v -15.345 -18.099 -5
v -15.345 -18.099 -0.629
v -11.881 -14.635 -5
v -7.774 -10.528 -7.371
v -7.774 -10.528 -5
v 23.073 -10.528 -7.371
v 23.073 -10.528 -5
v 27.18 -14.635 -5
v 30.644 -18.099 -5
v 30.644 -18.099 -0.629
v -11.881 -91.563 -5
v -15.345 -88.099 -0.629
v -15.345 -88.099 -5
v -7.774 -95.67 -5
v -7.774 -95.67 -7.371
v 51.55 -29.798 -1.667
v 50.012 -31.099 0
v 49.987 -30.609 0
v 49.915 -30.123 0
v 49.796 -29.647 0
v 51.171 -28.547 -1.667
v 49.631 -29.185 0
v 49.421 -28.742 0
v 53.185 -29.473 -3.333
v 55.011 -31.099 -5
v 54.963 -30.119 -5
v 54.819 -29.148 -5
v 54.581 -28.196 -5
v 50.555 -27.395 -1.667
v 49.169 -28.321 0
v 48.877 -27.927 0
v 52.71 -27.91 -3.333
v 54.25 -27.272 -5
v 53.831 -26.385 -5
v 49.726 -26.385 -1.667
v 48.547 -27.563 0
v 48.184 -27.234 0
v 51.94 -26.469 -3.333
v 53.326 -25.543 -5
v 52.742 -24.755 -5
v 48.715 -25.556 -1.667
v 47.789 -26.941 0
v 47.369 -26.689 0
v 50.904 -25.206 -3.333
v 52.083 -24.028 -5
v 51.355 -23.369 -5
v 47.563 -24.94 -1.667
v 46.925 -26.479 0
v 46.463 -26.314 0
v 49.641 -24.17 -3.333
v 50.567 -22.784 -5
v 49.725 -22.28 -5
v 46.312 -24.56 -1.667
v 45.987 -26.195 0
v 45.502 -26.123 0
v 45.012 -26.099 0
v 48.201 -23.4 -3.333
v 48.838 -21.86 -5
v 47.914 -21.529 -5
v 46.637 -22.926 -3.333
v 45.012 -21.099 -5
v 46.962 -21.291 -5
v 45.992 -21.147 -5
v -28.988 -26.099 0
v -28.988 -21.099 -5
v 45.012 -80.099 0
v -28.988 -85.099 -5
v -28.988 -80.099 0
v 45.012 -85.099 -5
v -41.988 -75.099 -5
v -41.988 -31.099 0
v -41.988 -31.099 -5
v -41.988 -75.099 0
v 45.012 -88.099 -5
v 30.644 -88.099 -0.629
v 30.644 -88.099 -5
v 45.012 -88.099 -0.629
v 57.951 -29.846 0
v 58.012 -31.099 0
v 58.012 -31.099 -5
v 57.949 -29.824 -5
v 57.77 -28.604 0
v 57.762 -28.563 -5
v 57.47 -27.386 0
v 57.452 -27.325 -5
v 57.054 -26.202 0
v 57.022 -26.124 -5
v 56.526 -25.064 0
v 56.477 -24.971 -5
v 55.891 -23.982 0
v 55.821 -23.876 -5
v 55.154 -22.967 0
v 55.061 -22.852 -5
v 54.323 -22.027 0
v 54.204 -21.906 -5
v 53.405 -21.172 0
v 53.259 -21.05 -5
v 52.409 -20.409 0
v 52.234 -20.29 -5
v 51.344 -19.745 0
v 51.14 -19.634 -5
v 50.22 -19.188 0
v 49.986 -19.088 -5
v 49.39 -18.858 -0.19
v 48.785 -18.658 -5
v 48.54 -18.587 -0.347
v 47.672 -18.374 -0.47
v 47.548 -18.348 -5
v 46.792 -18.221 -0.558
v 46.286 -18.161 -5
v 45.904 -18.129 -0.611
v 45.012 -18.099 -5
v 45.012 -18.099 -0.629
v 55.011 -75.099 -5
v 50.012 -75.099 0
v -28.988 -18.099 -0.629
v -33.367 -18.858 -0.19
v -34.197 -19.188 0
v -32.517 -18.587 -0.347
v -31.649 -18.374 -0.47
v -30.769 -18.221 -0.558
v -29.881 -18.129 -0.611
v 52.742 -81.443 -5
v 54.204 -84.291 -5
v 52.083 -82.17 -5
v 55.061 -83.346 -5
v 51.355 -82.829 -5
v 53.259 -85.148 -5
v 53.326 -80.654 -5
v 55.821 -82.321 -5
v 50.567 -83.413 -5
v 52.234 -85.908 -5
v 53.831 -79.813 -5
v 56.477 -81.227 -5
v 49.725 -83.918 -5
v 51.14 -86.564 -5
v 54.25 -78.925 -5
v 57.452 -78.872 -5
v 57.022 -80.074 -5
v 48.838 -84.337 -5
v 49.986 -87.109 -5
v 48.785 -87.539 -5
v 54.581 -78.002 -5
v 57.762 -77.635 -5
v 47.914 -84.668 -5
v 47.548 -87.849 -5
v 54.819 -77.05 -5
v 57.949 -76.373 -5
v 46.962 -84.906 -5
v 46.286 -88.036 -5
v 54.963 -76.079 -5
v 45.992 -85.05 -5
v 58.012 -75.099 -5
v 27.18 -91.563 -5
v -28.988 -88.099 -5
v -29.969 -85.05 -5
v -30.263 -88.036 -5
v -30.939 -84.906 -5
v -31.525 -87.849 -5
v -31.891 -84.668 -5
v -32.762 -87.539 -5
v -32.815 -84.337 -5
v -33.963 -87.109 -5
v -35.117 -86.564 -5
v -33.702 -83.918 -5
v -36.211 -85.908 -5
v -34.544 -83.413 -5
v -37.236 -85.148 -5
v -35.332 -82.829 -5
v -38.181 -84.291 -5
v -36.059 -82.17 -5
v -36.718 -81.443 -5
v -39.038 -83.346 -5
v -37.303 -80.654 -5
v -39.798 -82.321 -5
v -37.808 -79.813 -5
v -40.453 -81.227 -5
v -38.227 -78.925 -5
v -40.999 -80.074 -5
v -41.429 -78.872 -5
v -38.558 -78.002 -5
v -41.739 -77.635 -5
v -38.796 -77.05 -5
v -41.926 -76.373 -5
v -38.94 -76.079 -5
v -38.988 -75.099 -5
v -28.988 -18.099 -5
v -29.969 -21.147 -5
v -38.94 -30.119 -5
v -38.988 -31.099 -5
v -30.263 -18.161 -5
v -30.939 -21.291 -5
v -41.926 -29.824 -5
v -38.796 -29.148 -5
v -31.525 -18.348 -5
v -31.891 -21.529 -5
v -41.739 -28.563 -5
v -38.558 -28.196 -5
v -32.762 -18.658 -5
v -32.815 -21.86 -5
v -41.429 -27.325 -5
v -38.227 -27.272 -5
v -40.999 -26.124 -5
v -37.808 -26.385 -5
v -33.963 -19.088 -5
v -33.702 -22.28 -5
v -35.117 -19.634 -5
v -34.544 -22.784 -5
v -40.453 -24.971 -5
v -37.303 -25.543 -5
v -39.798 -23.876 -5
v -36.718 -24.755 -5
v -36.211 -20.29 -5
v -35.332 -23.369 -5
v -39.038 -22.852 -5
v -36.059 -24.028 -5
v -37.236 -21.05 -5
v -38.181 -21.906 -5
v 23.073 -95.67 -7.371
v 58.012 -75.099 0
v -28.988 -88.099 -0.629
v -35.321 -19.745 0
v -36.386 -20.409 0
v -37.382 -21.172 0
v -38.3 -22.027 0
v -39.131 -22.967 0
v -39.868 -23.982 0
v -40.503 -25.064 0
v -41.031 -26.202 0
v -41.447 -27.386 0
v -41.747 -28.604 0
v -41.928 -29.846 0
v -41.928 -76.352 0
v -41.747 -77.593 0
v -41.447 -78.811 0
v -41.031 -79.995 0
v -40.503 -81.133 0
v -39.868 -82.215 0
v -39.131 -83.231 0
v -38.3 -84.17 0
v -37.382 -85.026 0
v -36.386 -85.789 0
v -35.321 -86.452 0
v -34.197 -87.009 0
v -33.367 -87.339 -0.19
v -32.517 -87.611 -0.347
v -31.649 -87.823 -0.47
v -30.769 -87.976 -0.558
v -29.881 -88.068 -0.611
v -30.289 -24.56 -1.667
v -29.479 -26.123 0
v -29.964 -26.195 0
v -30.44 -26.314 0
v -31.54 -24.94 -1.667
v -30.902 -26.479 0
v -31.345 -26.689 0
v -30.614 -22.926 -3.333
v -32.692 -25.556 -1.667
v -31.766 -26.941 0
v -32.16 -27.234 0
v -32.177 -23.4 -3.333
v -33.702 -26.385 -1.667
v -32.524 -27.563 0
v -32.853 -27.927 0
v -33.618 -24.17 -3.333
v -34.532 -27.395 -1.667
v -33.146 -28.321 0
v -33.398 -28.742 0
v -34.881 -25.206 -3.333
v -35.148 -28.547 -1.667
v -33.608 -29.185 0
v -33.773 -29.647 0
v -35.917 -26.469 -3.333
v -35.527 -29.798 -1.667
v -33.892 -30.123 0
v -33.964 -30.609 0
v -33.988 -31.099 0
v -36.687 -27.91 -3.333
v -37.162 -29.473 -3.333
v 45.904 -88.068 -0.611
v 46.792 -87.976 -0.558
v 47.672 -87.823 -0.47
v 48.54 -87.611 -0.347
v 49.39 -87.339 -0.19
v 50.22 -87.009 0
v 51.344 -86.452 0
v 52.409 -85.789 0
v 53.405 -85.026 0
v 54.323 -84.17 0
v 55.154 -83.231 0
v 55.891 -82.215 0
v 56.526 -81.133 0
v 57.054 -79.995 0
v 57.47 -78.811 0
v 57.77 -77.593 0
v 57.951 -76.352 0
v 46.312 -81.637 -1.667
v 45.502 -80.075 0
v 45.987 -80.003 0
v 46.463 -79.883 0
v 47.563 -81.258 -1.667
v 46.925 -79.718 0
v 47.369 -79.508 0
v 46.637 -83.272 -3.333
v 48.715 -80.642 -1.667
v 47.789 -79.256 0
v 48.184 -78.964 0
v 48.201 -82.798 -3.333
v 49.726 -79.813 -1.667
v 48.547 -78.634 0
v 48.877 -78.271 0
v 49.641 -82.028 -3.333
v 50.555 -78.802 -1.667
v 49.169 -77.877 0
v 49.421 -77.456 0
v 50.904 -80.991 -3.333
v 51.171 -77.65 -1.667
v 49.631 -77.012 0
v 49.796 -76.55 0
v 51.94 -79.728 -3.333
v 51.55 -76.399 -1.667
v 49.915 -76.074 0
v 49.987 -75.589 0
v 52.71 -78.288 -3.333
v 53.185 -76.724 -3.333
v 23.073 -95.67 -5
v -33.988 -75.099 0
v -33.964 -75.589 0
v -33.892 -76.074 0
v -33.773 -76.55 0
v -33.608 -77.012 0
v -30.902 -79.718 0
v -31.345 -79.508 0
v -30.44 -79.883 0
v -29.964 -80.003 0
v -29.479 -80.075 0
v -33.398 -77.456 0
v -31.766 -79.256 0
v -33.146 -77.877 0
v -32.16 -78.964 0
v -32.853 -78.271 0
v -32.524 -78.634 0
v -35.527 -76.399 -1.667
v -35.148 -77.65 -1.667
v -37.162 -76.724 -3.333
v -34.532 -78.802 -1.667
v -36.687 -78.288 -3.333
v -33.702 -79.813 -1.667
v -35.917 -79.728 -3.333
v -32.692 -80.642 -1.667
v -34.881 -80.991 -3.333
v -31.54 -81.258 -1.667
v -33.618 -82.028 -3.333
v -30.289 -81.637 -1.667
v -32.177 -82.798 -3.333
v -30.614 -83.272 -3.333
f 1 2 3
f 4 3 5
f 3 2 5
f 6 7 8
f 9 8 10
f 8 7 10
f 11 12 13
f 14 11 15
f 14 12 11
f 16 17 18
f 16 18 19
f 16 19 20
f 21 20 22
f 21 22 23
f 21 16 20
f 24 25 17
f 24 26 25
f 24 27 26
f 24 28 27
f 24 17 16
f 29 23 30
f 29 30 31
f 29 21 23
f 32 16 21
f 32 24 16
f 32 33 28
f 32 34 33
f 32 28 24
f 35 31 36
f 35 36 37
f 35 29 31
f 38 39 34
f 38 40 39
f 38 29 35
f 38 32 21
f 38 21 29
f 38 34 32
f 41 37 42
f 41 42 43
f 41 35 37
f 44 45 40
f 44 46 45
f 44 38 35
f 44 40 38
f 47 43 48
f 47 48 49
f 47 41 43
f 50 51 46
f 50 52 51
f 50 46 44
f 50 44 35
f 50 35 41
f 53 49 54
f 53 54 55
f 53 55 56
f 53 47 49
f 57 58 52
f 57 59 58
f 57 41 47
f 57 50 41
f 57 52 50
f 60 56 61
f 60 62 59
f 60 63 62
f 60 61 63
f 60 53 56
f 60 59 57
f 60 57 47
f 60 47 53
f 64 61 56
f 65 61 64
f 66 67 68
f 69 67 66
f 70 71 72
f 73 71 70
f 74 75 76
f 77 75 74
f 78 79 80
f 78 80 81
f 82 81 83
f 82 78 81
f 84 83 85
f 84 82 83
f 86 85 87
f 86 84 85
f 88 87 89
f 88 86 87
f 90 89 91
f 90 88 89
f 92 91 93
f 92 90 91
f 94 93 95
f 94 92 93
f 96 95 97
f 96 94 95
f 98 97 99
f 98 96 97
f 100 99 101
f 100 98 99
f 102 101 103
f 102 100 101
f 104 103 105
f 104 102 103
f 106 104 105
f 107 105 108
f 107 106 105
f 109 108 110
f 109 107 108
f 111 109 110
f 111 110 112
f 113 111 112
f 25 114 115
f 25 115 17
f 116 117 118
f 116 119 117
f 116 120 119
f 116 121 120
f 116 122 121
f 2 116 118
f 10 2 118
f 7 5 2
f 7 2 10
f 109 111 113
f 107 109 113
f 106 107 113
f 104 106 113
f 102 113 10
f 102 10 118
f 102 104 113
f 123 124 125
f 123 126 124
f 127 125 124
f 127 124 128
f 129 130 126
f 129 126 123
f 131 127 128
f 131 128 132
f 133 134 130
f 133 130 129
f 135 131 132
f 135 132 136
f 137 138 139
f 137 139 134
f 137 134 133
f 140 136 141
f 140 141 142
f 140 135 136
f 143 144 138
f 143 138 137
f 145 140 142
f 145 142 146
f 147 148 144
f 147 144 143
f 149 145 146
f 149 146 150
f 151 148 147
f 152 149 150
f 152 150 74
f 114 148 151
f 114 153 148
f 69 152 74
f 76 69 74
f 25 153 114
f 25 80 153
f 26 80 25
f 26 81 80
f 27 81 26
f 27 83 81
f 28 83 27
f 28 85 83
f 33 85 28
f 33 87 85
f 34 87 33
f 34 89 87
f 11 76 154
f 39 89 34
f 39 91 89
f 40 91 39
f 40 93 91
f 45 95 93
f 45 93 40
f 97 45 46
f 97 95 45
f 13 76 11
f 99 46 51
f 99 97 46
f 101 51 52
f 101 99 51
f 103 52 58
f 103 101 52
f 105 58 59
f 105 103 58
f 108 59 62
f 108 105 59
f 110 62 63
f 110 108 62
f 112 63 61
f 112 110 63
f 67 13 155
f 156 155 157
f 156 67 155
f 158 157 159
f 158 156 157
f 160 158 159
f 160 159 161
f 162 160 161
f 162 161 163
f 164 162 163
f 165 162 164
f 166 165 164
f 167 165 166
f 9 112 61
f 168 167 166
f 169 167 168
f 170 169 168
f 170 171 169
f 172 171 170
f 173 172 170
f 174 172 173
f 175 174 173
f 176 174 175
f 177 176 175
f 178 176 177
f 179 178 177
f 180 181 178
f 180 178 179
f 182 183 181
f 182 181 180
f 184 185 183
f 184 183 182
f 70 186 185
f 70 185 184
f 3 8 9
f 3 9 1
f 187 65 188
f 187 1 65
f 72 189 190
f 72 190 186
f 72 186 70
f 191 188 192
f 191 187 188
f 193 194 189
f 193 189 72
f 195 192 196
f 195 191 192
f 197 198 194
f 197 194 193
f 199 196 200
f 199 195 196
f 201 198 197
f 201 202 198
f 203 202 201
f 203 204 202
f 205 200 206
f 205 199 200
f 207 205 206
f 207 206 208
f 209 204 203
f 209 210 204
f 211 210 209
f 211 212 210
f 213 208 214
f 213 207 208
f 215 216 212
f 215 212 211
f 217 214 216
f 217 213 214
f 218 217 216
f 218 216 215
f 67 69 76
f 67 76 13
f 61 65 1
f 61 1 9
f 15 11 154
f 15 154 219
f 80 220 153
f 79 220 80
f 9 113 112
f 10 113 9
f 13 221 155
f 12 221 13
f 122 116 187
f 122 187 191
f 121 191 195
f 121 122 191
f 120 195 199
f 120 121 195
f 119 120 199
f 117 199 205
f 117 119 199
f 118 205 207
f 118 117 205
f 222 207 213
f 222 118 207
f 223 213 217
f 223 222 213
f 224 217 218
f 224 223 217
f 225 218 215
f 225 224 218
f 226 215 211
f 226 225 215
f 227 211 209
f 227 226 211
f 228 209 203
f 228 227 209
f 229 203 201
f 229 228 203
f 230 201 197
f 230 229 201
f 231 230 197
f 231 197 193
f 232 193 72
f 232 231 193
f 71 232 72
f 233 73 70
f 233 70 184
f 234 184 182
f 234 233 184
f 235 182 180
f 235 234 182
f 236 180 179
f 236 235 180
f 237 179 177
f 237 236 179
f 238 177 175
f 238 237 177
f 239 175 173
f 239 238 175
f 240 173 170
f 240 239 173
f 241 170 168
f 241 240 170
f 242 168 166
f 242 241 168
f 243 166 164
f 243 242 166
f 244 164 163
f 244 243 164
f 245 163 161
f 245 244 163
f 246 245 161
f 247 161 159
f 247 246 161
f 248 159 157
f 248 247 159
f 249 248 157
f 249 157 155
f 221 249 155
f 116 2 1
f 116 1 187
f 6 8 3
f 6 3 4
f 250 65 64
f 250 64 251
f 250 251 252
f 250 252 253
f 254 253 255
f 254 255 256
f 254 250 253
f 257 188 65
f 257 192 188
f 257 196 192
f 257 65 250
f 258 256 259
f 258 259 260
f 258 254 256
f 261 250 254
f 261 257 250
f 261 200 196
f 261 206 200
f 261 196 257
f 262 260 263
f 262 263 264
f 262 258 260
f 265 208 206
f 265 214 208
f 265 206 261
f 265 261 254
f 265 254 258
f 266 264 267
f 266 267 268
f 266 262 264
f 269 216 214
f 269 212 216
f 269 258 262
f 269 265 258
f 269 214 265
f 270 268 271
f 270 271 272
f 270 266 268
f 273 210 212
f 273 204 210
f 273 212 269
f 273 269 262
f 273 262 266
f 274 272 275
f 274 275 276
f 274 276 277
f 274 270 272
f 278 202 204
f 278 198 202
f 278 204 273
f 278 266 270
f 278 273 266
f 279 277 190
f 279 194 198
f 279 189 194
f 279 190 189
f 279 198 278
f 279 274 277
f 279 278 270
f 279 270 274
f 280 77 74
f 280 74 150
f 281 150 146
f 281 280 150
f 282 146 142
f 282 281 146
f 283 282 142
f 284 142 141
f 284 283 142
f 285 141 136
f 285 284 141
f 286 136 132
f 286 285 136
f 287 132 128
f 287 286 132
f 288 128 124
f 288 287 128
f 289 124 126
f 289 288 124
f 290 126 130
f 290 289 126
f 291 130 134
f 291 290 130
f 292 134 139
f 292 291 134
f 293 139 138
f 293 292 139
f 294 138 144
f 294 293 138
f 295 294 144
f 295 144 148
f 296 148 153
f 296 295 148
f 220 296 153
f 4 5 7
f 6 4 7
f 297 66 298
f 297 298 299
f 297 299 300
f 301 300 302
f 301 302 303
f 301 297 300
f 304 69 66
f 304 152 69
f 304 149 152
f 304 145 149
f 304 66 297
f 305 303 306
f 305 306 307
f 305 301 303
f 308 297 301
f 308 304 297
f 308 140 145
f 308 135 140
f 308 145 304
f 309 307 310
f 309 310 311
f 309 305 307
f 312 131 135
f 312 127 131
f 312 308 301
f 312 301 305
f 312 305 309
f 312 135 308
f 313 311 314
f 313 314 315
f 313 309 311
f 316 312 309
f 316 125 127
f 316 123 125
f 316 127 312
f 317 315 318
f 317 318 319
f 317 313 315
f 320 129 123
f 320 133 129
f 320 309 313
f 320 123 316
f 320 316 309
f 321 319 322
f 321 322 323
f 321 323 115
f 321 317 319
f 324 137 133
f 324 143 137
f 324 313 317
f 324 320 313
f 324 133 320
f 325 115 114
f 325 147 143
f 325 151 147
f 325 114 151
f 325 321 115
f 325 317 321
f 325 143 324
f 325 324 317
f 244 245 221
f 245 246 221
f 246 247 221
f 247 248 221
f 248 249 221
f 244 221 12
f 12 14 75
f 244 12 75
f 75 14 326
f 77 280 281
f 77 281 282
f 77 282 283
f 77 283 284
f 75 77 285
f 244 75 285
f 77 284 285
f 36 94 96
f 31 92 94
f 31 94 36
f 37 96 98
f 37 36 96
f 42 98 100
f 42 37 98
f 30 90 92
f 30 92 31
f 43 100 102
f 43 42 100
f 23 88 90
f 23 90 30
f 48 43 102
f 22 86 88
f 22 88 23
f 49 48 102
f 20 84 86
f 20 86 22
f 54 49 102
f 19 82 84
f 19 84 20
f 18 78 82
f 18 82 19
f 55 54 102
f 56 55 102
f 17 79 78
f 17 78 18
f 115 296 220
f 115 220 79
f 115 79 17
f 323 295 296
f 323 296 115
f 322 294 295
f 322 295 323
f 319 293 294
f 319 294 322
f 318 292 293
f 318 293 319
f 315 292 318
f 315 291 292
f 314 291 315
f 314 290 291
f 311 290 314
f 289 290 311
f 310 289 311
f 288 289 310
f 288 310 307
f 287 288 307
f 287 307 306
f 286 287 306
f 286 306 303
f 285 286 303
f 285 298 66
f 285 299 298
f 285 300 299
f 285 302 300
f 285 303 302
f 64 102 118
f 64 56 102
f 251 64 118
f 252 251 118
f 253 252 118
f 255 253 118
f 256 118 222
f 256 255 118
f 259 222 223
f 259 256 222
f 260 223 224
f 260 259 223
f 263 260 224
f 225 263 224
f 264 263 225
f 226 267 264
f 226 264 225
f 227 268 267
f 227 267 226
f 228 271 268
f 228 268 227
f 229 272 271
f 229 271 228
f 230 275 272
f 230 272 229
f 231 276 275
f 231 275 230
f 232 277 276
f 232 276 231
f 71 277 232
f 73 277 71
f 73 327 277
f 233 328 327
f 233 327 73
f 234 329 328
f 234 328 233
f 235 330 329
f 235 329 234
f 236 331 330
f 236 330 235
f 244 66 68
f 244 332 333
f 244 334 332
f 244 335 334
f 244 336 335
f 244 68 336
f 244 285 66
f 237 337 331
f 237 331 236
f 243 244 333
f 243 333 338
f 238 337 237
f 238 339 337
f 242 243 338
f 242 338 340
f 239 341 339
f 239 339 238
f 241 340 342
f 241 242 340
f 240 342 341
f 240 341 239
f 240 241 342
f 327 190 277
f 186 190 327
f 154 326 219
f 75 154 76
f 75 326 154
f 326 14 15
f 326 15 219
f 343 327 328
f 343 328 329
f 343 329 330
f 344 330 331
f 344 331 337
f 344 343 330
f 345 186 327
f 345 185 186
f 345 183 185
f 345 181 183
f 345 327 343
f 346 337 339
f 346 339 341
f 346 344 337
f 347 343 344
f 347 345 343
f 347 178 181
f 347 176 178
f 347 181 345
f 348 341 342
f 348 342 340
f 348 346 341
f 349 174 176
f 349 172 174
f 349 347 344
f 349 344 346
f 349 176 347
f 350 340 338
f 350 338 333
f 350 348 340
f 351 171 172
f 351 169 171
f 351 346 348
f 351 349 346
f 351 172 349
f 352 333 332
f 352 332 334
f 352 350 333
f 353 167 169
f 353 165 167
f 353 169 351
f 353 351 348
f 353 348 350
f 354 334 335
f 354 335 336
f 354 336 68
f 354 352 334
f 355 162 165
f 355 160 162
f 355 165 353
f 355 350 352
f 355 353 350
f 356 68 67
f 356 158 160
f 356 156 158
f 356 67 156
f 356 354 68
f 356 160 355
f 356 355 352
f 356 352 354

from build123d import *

# Parameters (mm, degrees)
BOSS_EXTRUDE1_DEPTH       = 5
CHAMFER1_SIZE             = 5
BOSS_EXTRUDE2_DEPTH       = 8
CHAMFER2_SIZE2            = 5
CHAMFER2_SIZE             = 8.660254038
CHAMFER2_OF_MIRROR1_SIZE2 = 5
CHAMFER2_OF_MIRROR1_SIZE  = 8.660254038


# Some blends are built 0.0001 mm under size
with BuildPart() as part:
    # Sketch1 → Boss-Extrude1 (new body)
    # profile 1 of 2: a face of its own
    with BuildSketch(Plane.XY):
        with BuildLine():
            Line((-41.988438617, -31.098685124), (-41.988438617, -75.098685124))
            ThreePointArc((-41.988438617, -75.098685124), (-38.180826772, -84.291073279), (-28.988438617, -88.098685124))
            Line((-28.988438617, -88.098685124), (45.011561383, -88.098685124))
            ThreePointArc((45.011561383, -88.098685124), (54.203949538, -84.291073279), (58.011561383, -75.098685124))
            Line((58.011561383, -75.098685124), (58.011561383, -31.098685124))
            ThreePointArc((58.011561383, -31.098685124), (54.203949538, -21.906296968), (45.011561383, -18.098685124))
            Line((45.011561383, -18.098685124), (-28.988438617, -18.098685124))
            ThreePointArc((-28.988438617, -18.098685124), (-38.180826772, -21.906296968), (-41.988438617, -31.098685124))
        make_face()
        with BuildLine():
            ThreePointArc((-38.988438617, -75.098685124), (-36.059506429, -82.169752935), (-28.988438617, -85.098685124))
            Line((-28.988438617, -85.098685124), (45.011561383, -85.098685124))
            ThreePointArc((45.011561383, -85.098685124), (52.082629195, -82.169752935), (55.011561383, -75.098685124))
            Line((55.011561383, -75.098685124), (55.011561383, -31.098685124))
            ThreePointArc((55.011561383, -31.098685124), (52.082629195, -24.027617312), (45.011561383, -21.098685124))
            Line((45.011561383, -21.098685124), (-28.988438617, -21.098685124))
            ThreePointArc((-28.988438617, -21.098685124), (-36.059506429, -24.027617312), (-38.988438617, -31.098685124))
            Line((-38.988438617, -31.098685124), (-38.988438617, -75.098685124))
        make_face(mode=Mode.SUBTRACT)
    # profile 2 of 2: a face of its own
    with BuildSketch(Plane.XY):
        with BuildLine():
            Line((-38.988438617, -31.098685124), (-38.988438617, -75.098685124))
            ThreePointArc((-38.988438617, -75.098685124), (-36.059506429, -82.169752935), (-28.988438617, -85.098685124))
            Line((-28.988438617, -85.098685124), (45.011561383, -85.098685124))
            ThreePointArc((45.011561383, -85.098685124), (52.082629195, -82.169752935), (55.011561383, -75.098685124))
            Line((55.011561383, -75.098685124), (55.011561383, -31.098685124))
            ThreePointArc((55.011561383, -31.098685124), (52.082629195, -24.027617312), (45.011561383, -21.098685124))
            Line((45.011561383, -21.098685124), (-28.988438617, -21.098685124))
            ThreePointArc((-28.988438617, -21.098685124), (-36.059506429, -24.027617312), (-38.988438617, -31.098685124))
        make_face()
        with BuildLine():
            ThreePointArc((-33.988438617, -75.098685124), (-32.523972523, -78.63421903), (-28.988438617, -80.098685124))
            Line((-28.988438617, -80.098685124), (45.011561383, -80.098685124))
            ThreePointArc((45.011561383, -80.098685124), (48.547095289, -78.63421903), (50.011561383, -75.098685124))
            Line((50.011561383, -75.098685124), (50.011561383, -31.098685124))
            ThreePointArc((50.011561383, -31.098685124), (48.547095289, -27.563151218), (45.011561383, -26.098685124))
            Line((45.011561383, -26.098685124), (-28.988438617, -26.098685124))
            ThreePointArc((-28.988438617, -26.098685124), (-32.523972523, -27.563151218), (-33.988438617, -31.098685124))
            Line((-33.988438617, -31.098685124), (-33.988438617, -75.098685124))
        make_face(mode=Mode.SUBTRACT)
    extrude(amount=-BOSS_EXTRUDE1_DEPTH)

    # Chamfer1
    chamfer1_edges = [part.edges().sort_by_distance(p)[0] for p in [
        (8.011561383, -80.098685124, -5),
        (48.547095289, -78.63421903, -5),
        (-32.523972523, -78.63421903, -5),
        (50.011561383, -53.098685124, -5),
        (-33.988438617, -53.098685124, -5),
        (48.547095289, -27.563151218, -5),
        (-32.523972523, -27.563151218, -5),
        (8.011561383, -26.098685124, -5),
    ]]
    chamfer(chamfer1_edges, length=CHAMFER1_SIZE - 0.0001)  # a hair under: the kernel refuses the full size

    # Sketch2 → Boss-Extrude2 (add)
    with BuildSketch(Plane.XY):
        Polygon((-15.345428916, -18.098685124), (-7.774377041, -10.527633249), (23.073373404, -10.527633249), (30.644425279, -18.098685124), align=None)
    boss_extrude2 = extrude(amount=-BOSS_EXTRUDE2_DEPTH)

    # Chamfer2
    chamfer2_edges = [part.edges().sort_by_distance(p)[0] for p in [
        (7.649498182, -10.527633249, 0),
    ]]
    chamfer2_side = [part.faces().sort_by_distance(p)[0] for p in [
        (7.649498182, -10.627633249, 0),
    ]]
    chamfer(chamfer2_edges, length=CHAMFER2_SIZE, length2=CHAMFER2_SIZE2, reference=chamfer2_side[0])
    # the kernel refuses this chamfer: 8.660254038, 5 mm, written as the material it takes off along each edge
    with BuildSketch(Plane(origin=(53.049245132, -18.098685124, -8), x_dir=(0, -0.05789386240267115, 0.9983227437537926), z_dir=(-1, 0, 0))) as chamfer2_2_piece_1_section:
        with BuildLine():
            Line((5.181896449, 0), (-0.691658286, 8.935197885))
            Line((-0.691658286, 8.935197885), (-0.864572857, 8.925170374))
            ThreePointArc((-0.864572857, 8.925170374), (-0.432286429, 4.462585187), (-0.172914571, -0.010027511))
            Line((-0.172914571, -0.010027511), (0.010027511, -0.172914571))
            ThreePointArc((0.010027511, -0.172914571), (2.592291656, -0.02316616), (5.19192396, -0.172914571))
            Line((5.19192396, -0.172914571), (5.181896449, 0))
        make_face()
    chamfer2_2_piece_1 = extrude(amount=90.7994939, mode=Mode.PRIVATE)
    chamfer2_2_piece_1 = split(chamfer2_2_piece_1, bisect_by=Plane(origin=(7.649498182, -14.797310686, -5), z_dir=(0, 0, -1)), keep=Keep.TOP, mode=Mode.PRIVATE)
    add(chamfer2_2_piece_1, mode=Mode.SUBTRACT)

    # Mirror1: Boss-Extrude2 across plane
    add(boss_extrude2.mirror(Plane.ZX.offset(-53.098685124)))

    # Chamfer2 of Mirror1
    chamfer2_of_mirror1_edges = [part.edges().sort_by_distance(p)[0] for p in [
        (7.649498182, -95.669736998, 0),
    ]]
    chamfer2_of_mirror1_side = [part.faces().sort_by_distance(p)[0] for p in [
        (7.649498182, -95.569736998, 0),
    ]]
    chamfer(chamfer2_of_mirror1_edges, length=CHAMFER2_OF_MIRROR1_SIZE, length2=CHAMFER2_OF_MIRROR1_SIZE2, reference=chamfer2_of_mirror1_side[0])
    # the kernel refuses this chamfer: 8.660254038, 5 mm, written as the material it takes off along each edge
    with BuildSketch(Plane(origin=(53.049245132, -88.098685124, -8), x_dir=(0, 0.057893862402670464, 0.9983227437537926), z_dir=(-1, 0, 0))) as chamfer2_of_mirror1_2_piece_1_section:
        with BuildLine():
            Line((5.181896449, 0), (-0.691658286, -8.935197885))
            Line((-0.691658286, -8.935197885), (-0.864572857, -8.925170374))
            ThreePointArc((-0.864572857, -8.925170374), (-0.432286429, -4.462585187), (-0.172914571, 0.010027511))
            Line((-0.172914571, 0.010027511), (0.010027511, 0.172914571))
            ThreePointArc((0.010027511, 0.172914571), (2.592291656, 0.02316616), (5.19192396, 0.172914571))
            Line((5.19192396, 0.172914571), (5.181896449, 0))
        make_face()
    chamfer2_of_mirror1_2_piece_1 = extrude(amount=90.7994939, mode=Mode.PRIVATE)
    chamfer2_of_mirror1_2_piece_1 = split(chamfer2_of_mirror1_2_piece_1, bisect_by=Plane(origin=(7.649498182, -91.400059561, -5), z_dir=(0, 0, -1)), keep=Keep.TOP, mode=Mode.PRIVATE)
    add(chamfer2_of_mirror1_2_piece_1, mode=Mode.SUBTRACT)


solid = part.part
